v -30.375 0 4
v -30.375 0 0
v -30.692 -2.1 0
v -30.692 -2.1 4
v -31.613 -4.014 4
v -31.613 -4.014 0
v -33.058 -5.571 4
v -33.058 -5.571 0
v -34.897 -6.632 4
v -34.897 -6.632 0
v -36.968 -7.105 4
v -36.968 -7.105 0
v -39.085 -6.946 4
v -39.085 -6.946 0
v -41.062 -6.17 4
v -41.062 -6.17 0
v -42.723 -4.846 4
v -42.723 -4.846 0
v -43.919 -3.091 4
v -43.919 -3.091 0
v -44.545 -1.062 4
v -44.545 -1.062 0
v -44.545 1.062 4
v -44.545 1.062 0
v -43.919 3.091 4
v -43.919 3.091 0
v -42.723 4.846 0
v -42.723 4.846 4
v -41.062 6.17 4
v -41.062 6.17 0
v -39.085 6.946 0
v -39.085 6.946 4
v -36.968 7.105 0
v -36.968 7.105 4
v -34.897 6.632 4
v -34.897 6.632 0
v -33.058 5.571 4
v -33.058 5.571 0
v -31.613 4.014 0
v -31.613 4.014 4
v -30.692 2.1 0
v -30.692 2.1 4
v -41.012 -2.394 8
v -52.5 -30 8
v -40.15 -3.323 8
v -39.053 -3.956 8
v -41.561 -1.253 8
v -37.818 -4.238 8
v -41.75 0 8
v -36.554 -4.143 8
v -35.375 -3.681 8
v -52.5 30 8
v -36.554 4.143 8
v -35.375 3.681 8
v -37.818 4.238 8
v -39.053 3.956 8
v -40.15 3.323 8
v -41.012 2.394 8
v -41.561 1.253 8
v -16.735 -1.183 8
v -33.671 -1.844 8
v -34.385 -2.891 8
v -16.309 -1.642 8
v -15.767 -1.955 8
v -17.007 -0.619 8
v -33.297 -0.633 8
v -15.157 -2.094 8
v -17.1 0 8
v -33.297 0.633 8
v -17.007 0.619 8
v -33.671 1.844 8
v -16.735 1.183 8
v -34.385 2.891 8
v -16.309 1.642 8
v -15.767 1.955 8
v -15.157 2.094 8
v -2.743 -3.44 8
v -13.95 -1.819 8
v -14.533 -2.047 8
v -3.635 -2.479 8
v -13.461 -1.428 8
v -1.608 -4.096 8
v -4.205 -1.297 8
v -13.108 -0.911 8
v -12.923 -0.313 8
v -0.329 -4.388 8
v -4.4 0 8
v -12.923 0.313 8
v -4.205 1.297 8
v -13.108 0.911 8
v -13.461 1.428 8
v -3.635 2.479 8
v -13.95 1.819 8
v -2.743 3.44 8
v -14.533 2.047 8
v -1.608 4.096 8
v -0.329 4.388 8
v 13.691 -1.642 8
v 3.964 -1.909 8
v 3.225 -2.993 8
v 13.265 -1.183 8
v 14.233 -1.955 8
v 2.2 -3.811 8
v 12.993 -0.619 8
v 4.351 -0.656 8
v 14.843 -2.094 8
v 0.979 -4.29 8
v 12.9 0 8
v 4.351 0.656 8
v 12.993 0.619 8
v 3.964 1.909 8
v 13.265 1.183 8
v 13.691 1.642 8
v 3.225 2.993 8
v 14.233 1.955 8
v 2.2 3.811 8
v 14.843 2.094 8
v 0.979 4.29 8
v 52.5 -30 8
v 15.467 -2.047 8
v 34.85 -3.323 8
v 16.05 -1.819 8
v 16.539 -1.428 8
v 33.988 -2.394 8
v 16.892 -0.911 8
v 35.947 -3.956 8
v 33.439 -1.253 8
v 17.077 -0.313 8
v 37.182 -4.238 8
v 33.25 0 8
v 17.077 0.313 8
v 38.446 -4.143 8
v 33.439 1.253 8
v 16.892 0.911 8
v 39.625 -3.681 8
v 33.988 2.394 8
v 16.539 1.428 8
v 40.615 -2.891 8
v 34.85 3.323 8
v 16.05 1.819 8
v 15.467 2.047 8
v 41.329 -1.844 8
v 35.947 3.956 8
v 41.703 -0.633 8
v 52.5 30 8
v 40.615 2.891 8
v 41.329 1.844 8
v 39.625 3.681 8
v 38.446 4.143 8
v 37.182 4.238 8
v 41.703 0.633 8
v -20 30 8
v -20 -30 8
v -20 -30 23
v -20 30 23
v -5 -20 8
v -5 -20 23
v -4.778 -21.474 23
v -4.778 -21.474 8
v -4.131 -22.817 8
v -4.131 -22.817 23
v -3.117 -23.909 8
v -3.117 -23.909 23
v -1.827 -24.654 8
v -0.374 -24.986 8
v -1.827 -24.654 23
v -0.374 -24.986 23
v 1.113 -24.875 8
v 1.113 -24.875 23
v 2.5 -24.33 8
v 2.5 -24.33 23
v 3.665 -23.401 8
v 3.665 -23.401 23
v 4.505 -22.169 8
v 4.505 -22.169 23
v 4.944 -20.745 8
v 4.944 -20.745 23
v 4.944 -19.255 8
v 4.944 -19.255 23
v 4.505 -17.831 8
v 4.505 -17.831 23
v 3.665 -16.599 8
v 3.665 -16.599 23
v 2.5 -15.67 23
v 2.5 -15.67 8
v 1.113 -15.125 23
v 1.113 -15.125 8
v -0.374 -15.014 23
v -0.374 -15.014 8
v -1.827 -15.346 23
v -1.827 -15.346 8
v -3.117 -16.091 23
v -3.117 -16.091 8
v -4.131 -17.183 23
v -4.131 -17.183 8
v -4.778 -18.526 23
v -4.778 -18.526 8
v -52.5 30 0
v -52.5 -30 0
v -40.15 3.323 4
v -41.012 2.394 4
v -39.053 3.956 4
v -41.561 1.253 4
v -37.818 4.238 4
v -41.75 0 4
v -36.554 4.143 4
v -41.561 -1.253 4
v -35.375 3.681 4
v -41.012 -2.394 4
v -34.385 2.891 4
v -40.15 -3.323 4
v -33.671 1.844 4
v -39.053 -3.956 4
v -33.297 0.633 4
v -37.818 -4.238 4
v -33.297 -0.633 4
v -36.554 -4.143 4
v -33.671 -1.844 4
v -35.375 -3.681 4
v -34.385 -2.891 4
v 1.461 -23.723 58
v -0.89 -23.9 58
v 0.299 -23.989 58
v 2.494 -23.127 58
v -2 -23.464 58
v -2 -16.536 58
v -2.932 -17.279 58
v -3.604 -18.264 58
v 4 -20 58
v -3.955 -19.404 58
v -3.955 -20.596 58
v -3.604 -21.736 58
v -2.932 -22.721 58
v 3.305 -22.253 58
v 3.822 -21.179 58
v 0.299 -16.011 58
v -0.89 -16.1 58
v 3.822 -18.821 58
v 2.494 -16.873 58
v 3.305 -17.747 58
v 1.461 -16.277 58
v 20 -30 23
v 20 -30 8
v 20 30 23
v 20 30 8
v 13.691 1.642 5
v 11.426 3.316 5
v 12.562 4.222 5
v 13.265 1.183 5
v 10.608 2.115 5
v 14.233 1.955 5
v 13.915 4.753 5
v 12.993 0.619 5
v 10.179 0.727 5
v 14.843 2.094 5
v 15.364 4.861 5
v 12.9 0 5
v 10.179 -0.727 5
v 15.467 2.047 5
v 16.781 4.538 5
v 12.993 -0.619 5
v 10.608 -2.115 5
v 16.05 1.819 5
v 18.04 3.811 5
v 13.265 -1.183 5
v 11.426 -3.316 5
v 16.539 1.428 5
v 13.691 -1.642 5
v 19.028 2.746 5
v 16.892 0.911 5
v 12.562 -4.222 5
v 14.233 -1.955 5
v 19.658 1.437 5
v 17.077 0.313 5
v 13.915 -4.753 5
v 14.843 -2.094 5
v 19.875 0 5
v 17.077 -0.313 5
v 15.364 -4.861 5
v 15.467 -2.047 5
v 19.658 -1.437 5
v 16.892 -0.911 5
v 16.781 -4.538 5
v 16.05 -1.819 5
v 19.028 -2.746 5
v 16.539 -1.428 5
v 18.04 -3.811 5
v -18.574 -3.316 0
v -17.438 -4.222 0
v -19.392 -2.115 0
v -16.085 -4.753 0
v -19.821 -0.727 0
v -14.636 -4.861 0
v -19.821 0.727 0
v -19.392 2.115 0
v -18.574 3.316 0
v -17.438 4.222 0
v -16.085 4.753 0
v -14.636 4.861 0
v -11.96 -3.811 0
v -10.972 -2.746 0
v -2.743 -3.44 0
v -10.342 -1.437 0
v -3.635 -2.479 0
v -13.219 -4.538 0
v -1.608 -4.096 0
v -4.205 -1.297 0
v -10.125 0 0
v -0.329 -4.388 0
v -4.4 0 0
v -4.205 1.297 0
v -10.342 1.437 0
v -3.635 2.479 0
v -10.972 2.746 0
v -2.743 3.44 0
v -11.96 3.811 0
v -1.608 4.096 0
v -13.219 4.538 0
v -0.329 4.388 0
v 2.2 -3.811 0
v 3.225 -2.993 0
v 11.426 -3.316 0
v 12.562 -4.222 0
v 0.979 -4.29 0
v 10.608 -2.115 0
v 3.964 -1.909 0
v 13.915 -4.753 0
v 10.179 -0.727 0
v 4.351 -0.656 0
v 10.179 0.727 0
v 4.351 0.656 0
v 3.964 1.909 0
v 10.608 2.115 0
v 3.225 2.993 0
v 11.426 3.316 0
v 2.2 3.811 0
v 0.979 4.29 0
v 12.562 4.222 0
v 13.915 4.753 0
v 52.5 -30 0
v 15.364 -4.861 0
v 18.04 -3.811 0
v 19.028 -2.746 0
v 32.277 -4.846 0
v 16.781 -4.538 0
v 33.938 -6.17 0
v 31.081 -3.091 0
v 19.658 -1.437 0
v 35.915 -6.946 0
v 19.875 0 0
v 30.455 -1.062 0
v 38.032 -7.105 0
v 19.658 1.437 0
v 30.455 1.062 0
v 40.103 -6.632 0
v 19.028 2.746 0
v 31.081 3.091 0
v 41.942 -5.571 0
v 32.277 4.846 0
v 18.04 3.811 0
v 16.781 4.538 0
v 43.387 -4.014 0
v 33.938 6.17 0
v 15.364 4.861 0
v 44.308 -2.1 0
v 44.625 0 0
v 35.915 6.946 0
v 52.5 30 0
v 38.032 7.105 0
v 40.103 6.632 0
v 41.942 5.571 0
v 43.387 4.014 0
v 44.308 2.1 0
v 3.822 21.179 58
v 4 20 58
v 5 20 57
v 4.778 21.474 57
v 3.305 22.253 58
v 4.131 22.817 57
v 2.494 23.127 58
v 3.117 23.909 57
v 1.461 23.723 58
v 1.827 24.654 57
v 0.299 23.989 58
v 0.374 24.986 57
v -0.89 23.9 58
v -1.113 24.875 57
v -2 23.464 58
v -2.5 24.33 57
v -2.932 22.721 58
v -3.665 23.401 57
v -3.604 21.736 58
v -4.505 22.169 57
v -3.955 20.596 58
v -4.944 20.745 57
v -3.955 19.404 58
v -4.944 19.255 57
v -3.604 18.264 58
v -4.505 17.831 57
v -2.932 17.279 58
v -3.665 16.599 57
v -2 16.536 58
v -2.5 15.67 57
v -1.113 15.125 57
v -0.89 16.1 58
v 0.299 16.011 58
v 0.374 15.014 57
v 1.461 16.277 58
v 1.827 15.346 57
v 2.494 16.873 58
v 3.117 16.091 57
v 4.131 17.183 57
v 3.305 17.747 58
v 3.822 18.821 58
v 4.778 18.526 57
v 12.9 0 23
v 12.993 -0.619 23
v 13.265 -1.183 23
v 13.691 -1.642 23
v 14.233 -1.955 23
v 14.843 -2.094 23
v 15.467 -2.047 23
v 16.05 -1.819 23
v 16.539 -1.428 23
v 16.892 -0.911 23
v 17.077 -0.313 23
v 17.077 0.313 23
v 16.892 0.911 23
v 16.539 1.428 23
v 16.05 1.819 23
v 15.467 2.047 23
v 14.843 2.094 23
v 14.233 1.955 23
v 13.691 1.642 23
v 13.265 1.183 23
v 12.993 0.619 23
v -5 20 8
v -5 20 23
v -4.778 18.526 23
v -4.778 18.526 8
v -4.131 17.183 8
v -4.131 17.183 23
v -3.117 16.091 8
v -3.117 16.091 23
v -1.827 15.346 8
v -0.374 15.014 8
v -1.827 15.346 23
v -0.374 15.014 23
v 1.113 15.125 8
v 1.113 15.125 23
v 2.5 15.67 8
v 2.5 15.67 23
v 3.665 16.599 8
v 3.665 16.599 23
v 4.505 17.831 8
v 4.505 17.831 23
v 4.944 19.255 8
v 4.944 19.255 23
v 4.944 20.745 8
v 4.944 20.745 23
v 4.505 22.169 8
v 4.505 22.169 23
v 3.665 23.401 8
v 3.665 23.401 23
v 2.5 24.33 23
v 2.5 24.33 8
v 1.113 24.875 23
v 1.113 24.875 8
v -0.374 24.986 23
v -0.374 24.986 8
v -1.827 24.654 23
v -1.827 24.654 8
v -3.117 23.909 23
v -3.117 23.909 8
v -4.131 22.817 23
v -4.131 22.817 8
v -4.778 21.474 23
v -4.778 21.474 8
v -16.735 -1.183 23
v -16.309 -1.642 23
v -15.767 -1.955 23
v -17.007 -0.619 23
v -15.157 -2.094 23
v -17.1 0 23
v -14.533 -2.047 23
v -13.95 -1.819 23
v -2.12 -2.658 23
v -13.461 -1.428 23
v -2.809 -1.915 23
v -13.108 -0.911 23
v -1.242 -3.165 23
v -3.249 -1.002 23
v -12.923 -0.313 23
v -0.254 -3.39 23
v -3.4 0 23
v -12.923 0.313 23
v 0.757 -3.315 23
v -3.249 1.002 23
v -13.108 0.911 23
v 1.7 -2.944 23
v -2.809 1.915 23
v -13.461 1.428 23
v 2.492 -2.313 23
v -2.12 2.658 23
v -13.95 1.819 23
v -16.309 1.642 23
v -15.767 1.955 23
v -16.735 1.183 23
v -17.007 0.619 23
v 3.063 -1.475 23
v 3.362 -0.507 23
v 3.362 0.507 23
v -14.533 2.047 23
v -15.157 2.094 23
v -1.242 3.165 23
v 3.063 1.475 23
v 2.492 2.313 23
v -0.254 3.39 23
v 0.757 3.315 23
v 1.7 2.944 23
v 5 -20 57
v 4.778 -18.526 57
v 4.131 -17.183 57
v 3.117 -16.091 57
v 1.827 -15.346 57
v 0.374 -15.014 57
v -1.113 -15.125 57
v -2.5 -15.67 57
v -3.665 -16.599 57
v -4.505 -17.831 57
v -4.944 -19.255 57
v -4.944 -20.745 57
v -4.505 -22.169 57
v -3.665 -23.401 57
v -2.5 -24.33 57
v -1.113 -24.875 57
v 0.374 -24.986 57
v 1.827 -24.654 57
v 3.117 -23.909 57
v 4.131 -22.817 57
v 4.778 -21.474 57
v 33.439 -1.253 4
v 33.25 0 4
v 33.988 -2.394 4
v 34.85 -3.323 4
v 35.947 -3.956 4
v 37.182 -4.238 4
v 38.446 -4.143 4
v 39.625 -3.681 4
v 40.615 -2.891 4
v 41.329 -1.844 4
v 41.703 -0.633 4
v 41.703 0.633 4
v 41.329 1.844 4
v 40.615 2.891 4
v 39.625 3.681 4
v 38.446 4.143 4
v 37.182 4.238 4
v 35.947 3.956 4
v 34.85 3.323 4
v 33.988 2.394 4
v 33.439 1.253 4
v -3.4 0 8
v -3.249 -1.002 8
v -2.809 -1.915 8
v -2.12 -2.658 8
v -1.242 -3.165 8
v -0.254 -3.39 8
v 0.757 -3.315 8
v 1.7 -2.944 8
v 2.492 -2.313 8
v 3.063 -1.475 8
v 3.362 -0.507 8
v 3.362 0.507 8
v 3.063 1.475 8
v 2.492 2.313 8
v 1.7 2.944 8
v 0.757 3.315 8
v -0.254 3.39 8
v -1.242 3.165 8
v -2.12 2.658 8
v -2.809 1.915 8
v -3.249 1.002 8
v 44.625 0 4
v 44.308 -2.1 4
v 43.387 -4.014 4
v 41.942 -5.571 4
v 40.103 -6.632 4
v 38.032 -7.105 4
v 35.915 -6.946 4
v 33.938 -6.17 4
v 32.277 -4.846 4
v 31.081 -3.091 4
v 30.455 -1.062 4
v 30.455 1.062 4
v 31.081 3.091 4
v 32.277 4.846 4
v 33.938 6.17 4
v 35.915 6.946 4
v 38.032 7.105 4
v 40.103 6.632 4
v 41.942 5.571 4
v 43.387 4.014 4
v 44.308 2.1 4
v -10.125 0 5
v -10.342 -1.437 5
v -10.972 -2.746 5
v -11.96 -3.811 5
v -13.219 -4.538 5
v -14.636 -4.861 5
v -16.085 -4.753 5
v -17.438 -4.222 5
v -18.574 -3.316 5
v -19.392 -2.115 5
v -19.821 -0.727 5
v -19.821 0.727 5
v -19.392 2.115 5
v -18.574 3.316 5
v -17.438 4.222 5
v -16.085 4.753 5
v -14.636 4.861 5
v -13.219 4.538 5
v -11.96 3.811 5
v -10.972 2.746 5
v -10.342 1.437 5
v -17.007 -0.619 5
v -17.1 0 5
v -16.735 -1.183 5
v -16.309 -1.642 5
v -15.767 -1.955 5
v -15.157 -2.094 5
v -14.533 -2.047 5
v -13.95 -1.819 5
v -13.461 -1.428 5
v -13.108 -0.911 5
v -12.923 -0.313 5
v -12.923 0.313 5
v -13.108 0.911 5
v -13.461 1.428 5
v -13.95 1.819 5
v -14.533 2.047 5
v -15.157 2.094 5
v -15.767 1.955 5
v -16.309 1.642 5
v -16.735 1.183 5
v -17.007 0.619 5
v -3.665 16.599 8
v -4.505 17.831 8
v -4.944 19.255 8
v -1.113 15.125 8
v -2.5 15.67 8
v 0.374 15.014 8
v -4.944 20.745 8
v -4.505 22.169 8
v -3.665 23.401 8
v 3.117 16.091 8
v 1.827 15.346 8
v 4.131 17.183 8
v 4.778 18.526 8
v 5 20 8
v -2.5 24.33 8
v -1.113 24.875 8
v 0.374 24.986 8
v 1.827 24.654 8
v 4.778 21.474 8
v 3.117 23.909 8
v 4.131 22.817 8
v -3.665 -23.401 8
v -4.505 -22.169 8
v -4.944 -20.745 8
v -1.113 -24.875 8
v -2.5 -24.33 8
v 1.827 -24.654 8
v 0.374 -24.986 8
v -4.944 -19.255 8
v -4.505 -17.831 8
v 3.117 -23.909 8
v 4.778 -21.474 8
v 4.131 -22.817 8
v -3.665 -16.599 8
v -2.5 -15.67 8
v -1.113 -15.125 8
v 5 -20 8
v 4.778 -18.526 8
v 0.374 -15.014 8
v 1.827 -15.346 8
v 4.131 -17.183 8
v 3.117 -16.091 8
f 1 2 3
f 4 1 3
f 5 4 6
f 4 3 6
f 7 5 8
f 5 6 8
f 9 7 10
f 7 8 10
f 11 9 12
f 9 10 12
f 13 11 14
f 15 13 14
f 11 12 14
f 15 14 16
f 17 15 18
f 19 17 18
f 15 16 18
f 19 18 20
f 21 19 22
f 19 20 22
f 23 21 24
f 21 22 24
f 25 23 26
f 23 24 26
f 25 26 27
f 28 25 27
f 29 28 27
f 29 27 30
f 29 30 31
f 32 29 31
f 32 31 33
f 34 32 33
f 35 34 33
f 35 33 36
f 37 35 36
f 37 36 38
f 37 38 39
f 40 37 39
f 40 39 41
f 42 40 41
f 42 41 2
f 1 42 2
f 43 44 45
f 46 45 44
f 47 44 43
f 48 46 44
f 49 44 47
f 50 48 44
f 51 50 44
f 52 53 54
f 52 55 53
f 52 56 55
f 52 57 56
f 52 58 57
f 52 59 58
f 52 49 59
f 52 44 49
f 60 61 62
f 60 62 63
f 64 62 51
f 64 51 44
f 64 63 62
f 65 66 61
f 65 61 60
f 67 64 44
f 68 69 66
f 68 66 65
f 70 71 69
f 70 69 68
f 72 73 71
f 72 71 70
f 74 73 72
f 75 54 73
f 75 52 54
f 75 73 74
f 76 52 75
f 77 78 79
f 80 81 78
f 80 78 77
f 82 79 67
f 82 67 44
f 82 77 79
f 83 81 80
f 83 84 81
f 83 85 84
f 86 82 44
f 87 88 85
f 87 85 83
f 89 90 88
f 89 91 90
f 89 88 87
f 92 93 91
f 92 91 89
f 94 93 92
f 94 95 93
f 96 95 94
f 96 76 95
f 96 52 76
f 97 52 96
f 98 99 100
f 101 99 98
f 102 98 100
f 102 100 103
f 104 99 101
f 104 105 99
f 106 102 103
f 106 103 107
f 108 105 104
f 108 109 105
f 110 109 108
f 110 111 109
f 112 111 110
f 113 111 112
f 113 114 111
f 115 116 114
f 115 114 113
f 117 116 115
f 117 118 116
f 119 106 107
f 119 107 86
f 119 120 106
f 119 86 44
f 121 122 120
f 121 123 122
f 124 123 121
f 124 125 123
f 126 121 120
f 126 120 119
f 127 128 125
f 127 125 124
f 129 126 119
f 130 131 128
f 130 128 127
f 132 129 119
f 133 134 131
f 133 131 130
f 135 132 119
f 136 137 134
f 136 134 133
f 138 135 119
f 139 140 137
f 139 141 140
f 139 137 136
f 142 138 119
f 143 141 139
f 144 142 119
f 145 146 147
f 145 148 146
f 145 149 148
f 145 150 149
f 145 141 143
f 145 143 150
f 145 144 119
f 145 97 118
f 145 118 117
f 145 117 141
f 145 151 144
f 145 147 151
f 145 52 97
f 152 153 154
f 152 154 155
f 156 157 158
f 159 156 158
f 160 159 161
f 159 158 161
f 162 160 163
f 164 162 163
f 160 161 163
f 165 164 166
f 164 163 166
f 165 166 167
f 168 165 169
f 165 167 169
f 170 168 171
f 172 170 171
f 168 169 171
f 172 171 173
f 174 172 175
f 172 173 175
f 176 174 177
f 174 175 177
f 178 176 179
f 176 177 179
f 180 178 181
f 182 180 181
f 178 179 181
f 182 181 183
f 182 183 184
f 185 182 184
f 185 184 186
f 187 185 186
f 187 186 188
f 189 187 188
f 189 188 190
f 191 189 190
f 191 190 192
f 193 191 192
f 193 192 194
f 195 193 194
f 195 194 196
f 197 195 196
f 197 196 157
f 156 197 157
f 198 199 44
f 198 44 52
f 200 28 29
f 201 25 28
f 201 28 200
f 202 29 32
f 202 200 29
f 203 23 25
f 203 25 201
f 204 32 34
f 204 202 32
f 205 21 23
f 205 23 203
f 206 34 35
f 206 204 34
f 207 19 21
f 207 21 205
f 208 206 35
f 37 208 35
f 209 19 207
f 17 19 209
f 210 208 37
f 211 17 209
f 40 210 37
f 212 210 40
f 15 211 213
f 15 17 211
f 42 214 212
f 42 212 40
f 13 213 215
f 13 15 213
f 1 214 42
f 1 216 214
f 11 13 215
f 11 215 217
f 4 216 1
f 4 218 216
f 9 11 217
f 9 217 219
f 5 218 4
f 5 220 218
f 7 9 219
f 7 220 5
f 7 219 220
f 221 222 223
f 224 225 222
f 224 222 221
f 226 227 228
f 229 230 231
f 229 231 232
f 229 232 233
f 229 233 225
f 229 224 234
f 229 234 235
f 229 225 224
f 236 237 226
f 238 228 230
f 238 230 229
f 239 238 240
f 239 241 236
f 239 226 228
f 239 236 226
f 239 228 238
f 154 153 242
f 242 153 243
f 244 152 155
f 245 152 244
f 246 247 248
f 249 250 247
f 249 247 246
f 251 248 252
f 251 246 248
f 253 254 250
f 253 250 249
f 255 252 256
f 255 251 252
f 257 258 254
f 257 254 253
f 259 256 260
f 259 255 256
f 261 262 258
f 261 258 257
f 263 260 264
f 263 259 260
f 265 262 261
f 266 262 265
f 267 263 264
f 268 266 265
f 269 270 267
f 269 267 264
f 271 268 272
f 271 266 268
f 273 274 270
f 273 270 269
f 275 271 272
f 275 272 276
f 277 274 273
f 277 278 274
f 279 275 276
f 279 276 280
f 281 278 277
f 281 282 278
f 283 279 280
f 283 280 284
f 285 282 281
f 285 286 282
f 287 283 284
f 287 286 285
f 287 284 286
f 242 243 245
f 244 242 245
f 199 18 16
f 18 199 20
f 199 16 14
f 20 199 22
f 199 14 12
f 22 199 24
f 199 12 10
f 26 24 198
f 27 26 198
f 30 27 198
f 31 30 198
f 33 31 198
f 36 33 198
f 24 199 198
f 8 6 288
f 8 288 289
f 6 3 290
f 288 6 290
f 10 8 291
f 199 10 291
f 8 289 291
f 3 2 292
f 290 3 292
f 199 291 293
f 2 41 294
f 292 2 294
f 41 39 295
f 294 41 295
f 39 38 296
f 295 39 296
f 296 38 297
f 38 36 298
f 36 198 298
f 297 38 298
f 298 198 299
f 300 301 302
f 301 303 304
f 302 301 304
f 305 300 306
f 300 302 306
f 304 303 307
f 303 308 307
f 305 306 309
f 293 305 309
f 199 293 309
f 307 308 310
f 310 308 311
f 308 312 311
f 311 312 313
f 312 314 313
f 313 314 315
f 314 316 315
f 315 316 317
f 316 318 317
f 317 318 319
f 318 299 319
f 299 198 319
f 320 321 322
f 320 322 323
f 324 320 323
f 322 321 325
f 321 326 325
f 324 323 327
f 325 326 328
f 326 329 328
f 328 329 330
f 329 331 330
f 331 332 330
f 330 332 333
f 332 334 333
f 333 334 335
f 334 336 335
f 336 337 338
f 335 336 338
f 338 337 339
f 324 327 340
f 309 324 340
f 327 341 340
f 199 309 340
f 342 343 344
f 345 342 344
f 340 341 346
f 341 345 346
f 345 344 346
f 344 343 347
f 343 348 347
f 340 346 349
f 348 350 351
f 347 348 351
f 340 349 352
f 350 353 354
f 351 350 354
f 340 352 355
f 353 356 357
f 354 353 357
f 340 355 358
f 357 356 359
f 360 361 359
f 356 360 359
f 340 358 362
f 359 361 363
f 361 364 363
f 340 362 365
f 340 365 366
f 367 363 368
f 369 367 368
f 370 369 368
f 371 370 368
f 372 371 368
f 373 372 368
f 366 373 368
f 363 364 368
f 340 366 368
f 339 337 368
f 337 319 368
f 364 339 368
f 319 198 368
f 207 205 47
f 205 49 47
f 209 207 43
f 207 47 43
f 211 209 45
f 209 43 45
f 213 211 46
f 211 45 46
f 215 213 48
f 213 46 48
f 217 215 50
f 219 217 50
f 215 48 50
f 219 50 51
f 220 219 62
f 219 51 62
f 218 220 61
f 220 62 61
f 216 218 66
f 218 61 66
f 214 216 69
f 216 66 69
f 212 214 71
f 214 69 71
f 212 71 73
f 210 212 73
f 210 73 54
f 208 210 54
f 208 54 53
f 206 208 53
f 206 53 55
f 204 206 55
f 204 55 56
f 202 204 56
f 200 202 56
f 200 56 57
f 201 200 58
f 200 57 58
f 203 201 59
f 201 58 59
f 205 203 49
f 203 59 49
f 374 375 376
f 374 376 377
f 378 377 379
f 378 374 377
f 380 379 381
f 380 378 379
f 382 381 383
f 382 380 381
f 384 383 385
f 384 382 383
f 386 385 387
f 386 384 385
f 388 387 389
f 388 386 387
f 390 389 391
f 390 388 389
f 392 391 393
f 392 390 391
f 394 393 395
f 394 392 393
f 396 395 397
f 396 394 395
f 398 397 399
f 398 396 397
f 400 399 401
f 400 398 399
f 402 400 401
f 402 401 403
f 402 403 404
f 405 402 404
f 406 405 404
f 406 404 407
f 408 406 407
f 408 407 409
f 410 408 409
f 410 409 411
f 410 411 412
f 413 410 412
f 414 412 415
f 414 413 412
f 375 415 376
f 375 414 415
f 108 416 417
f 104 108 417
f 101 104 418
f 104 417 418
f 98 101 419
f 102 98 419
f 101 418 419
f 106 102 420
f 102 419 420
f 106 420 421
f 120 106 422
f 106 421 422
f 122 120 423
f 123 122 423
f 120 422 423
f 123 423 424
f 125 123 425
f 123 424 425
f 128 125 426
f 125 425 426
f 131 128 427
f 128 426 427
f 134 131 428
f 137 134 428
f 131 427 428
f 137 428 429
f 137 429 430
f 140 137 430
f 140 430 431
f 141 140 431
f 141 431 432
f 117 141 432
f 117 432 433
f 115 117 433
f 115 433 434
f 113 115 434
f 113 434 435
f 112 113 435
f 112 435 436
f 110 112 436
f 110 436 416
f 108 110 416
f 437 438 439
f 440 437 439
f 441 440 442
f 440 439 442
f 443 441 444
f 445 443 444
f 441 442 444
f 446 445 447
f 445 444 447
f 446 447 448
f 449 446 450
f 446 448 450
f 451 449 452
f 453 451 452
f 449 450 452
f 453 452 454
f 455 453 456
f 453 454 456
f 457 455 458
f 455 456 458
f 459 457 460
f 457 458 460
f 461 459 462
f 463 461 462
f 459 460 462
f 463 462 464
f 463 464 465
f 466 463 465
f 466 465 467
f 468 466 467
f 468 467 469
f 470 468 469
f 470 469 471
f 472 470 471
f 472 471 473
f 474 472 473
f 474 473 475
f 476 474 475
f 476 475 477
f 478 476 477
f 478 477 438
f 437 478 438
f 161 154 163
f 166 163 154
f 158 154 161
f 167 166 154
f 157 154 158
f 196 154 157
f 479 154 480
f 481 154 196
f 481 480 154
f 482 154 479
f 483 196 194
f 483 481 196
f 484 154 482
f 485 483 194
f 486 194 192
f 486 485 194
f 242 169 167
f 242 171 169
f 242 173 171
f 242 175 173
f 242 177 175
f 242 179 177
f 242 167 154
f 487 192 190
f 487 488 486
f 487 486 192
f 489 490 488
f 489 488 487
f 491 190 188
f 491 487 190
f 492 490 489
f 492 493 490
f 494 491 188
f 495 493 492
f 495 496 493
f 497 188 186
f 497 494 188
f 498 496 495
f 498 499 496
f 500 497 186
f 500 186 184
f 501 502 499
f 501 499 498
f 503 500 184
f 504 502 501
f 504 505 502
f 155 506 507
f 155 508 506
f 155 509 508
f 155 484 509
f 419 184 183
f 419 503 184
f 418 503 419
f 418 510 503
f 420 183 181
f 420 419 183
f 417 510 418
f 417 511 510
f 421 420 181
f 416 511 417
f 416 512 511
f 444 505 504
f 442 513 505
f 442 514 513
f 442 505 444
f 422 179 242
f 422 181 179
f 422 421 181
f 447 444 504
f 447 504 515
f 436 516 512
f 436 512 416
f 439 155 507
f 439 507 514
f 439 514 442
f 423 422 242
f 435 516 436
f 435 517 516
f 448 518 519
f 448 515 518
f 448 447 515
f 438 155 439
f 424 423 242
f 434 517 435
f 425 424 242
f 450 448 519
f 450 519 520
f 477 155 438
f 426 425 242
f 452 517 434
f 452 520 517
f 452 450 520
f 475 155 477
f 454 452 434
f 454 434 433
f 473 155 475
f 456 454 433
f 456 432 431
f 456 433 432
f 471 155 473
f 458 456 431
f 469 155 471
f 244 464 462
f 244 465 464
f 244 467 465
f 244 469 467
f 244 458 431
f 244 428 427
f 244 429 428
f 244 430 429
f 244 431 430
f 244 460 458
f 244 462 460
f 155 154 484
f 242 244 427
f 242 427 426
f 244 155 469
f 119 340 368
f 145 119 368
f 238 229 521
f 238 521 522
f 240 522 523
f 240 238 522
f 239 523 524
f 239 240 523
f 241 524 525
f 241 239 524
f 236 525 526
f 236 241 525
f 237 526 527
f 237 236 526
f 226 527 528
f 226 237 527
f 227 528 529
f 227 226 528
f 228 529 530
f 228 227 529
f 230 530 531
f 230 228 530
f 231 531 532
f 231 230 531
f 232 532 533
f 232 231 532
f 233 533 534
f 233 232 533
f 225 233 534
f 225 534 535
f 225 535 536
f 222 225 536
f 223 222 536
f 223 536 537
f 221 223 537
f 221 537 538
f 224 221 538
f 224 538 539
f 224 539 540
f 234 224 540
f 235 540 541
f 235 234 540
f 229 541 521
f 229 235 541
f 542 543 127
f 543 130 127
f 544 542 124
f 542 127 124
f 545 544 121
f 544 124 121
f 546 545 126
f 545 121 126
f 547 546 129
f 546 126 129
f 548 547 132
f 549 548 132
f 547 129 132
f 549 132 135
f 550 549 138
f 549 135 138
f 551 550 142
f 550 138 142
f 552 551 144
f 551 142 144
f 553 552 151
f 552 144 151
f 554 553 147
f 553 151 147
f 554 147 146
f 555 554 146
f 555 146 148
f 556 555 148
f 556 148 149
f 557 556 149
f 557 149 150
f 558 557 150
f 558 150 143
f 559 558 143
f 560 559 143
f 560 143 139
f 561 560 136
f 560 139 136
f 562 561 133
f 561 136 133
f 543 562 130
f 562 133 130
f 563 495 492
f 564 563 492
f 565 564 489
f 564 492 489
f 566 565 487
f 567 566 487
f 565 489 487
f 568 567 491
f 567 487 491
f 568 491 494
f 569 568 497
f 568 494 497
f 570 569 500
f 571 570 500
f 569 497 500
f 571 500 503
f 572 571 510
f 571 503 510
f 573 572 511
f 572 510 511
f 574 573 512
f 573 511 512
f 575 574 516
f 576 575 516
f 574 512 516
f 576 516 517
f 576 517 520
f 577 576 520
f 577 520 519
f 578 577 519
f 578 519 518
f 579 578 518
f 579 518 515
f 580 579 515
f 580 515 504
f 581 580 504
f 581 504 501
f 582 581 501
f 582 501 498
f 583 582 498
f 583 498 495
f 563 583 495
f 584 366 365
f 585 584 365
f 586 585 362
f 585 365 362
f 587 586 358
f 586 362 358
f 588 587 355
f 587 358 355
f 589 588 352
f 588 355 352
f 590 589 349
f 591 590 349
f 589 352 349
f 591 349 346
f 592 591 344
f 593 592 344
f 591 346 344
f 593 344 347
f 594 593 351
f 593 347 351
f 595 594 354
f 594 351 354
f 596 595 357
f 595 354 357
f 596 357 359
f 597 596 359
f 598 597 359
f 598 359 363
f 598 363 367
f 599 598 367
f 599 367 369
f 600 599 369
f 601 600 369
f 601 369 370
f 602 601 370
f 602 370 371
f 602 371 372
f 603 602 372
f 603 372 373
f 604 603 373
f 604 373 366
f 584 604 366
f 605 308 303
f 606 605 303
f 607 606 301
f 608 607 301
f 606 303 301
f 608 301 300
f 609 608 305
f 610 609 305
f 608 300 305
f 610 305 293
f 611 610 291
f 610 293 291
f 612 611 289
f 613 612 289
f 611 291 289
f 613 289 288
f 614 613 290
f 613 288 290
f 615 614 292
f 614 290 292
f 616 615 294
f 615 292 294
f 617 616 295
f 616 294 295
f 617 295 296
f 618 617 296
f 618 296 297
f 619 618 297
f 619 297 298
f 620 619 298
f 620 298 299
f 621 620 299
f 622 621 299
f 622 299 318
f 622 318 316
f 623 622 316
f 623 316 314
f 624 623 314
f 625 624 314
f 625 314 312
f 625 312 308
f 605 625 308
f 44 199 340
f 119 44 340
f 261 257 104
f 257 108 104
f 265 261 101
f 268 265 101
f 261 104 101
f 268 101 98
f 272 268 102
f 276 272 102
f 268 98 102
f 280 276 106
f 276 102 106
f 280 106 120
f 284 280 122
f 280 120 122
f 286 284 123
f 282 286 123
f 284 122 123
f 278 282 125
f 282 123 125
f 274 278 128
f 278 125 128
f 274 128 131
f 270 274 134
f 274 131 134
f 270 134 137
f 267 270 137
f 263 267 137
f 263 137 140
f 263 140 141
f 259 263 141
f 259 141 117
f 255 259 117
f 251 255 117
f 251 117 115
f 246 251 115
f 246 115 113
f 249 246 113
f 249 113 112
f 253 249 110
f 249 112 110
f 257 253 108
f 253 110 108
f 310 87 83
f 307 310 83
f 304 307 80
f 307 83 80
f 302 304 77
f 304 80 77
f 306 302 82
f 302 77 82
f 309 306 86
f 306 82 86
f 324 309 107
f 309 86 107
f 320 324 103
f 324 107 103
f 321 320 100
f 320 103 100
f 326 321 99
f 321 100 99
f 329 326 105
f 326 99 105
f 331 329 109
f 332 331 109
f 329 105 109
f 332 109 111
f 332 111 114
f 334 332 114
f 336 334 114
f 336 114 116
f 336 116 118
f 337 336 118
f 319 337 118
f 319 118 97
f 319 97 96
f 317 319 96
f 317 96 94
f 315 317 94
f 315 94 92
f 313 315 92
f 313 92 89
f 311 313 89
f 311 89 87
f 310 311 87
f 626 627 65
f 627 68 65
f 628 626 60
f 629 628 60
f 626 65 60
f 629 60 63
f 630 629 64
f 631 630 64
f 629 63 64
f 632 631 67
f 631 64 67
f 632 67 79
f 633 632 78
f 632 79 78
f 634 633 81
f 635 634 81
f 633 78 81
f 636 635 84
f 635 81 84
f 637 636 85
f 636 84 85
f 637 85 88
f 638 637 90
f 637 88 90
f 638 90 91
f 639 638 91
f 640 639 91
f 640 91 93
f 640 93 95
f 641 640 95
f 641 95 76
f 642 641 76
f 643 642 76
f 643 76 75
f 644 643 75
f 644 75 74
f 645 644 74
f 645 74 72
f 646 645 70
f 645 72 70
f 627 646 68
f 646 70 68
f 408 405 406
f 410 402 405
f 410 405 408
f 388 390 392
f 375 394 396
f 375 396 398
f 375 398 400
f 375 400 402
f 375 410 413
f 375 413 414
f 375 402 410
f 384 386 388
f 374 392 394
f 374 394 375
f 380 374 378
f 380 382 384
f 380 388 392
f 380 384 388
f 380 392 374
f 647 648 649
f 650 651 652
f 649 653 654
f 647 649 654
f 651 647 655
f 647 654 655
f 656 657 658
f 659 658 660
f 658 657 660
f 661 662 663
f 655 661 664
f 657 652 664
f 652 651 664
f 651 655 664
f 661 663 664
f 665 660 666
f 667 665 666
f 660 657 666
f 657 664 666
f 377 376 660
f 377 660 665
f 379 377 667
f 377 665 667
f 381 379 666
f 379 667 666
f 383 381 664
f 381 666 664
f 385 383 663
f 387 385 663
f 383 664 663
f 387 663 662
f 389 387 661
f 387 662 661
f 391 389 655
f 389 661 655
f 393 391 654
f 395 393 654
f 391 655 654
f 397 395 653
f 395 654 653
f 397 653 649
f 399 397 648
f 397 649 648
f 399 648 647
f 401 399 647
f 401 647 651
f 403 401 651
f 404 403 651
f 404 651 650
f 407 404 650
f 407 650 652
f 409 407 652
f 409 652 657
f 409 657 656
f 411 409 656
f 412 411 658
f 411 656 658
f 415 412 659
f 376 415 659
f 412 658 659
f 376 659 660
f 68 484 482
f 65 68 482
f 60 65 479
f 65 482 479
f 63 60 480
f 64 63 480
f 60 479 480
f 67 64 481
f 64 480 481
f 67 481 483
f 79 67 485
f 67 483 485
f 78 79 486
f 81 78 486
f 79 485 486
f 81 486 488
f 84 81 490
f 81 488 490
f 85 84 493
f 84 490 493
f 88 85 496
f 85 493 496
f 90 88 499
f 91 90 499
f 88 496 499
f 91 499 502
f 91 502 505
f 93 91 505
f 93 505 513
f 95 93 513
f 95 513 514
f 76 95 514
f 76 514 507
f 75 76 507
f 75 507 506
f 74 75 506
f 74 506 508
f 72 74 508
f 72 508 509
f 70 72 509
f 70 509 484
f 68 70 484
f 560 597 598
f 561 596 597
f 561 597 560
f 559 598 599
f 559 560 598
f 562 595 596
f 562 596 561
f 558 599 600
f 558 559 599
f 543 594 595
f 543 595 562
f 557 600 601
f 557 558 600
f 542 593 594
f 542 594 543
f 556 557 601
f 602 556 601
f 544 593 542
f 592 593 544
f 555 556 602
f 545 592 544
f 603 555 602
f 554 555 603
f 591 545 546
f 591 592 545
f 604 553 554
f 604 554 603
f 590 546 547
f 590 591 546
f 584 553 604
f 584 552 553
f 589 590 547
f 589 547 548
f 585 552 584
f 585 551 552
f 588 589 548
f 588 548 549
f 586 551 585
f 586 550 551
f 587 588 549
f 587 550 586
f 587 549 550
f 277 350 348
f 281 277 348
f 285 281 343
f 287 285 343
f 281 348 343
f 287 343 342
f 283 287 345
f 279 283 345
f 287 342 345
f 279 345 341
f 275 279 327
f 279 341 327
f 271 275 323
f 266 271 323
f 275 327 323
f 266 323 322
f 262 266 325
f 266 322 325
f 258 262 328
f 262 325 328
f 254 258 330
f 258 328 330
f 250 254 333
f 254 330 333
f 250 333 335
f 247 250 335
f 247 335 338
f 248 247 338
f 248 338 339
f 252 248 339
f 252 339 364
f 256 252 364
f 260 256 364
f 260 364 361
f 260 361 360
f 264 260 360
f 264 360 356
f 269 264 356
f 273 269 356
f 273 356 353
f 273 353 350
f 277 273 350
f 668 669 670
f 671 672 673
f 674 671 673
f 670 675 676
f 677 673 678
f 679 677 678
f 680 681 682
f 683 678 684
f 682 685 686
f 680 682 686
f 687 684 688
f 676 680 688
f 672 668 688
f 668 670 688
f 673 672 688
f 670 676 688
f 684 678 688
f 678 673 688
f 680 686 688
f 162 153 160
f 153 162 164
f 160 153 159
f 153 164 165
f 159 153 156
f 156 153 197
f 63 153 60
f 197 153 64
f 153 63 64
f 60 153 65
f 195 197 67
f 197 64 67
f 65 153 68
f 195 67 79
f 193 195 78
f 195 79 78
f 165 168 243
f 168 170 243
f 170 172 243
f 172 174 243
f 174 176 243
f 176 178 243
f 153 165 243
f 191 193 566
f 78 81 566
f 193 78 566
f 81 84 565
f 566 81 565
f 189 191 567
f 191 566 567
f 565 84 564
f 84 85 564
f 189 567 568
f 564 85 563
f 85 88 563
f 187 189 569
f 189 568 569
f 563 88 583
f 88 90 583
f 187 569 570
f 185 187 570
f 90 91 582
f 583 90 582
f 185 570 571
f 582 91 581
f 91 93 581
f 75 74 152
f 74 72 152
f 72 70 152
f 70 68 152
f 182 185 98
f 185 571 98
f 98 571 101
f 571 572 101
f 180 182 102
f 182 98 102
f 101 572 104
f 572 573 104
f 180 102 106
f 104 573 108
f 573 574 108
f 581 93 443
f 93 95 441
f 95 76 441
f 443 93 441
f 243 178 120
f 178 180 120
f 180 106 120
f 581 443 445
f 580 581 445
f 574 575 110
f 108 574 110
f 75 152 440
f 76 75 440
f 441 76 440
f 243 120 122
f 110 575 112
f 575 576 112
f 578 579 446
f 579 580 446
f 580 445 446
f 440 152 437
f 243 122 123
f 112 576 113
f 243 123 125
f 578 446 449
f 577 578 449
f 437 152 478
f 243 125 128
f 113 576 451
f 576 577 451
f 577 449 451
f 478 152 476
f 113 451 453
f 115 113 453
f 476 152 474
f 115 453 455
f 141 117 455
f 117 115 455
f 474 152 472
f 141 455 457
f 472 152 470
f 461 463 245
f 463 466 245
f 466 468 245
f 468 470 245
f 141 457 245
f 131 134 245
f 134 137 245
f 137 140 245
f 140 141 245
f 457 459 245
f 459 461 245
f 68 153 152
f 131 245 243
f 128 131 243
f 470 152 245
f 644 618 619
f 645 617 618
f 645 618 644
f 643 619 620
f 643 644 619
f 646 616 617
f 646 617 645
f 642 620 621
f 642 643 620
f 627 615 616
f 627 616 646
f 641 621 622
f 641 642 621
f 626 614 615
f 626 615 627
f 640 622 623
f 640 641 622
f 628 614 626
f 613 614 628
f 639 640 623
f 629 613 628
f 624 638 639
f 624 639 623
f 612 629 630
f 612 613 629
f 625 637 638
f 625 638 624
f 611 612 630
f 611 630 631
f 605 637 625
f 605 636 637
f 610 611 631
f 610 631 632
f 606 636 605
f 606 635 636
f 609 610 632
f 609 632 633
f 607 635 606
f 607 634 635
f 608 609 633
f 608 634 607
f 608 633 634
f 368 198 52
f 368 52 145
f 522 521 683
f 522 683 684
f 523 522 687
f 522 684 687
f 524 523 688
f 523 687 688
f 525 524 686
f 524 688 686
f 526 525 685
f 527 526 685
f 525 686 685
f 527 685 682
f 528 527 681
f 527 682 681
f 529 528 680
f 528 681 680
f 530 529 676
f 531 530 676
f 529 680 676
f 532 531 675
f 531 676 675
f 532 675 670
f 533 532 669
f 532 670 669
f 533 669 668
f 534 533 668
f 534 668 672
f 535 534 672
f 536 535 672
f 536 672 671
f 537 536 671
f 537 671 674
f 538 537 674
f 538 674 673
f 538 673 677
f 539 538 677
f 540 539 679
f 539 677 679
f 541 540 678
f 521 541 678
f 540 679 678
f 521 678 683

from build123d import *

# Parameters (mm, degrees)
F0_W           = 105
F0_H           = 60
F1_DEPTH       = 8
F2_D           = 8.5
F2_CBORE_D     = 14.25
F2_CBORE_DEPTH = 4
F3_D           = 8.8
F4_D           = 4.2
F4_CBORE_D     = 9.75
F4_CBORE_DEPTH = 5
F5_W           = 40
F5_H           = 60
F6_DEPTH       = 15
F7_D           = 10
F8_D           = 4.2
F9_D           = 6.8
F10_R          = 5
F11_DEPTH      = 50
F12_SIZE       = 1
F12_2_SIZE     = 1


with BuildPart() as f1:
    # F0 (on Top) → F1 (new body)
    with BuildSketch(Plane.XY):
        Rectangle(F0_W, F0_H)
    extrude(amount=F1_DEPTH)

    # F2 (through all)
    with Locations(Plane(origin=(0, 0, 0), x_dir=(1, 0, 0), z_dir=(0, 0, -1))):
        with Locations((-37.5, 0), (37.5, 0)):
            CounterBoreHole(F2_D / 2, F2_CBORE_D / 2, F2_CBORE_DEPTH)

    # F3 (through all)
    with Locations(Plane(origin=(0, 0, 0), x_dir=(1, 0, 0), z_dir=(0, 0, -1))):
        with Locations((0, 0)):
            Hole(F3_D / 2)

    # F4 (through all)
    with Locations(Plane(origin=(0, 0, 0), x_dir=(1, 0, 0), z_dir=(0, 0, -1))):
        with Locations((-15, 0), (15, 0)):
            CounterBoreHole(F4_D / 2, F4_CBORE_D / 2, F4_CBORE_DEPTH)


with BuildPart() as f6:
    # F5 (on face) → F6 (new body)
    with BuildSketch(Plane.XY.offset(8)):
        Rectangle(F5_W, F5_H)
    extrude(amount=F6_DEPTH)

    # F7 (through all)
    with Locations(Plane(origin=(0, 0, 8), x_dir=(1, 0, 0), z_dir=(0, 0, -1))):
        with Locations((0, -20), (0, 20)):
            Hole(F7_D / 2)

    # F8 (through all)
    with Locations(Plane(origin=(0, 0, 8), x_dir=(1, 0, 0), z_dir=(0, 0, -1))):
        with Locations((-15, 0), (15, 0)):
            Hole(F8_D / 2)

    # F9 (through all)
    with Locations(Plane(origin=(0, 0, 8), x_dir=(1, 0, 0), z_dir=(0, 0, -1))):
        with Locations((0, 0)):
            Hole(F9_D / 2)


with BuildPart() as f11:
    # F10 (on face) → F11 (new body)
    with BuildSketch(Plane.XY.offset(8)):
        with Locations((0, -20)):
            Circle(F10_R)
    extrude(amount=F11_DEPTH)

    # F12
    f12_edges = [f11.edges().sort_by_distance(p)[0] for p in [
        (-5, -20, 58),
    ]]
    chamfer(f12_edges, length=F12_SIZE)


with BuildPart() as f11b:
    # F10 (on face) → F11, piece 2 (new body)
    with BuildSketch(Plane.XY.offset(8)):
        with Locations((0, 20)):
            Circle(F10_R)
    extrude(amount=F11_DEPTH)

    # F12#2
    f12_2_edges = [f11b.edges().sort_by_distance(p)[0] for p in [
        (-5, 20, 58),
    ]]
    chamfer(f12_2_edges, length=F12_2_SIZE)


solid = Compound([f1.part, f6.part, f11.part, f11b.part])
